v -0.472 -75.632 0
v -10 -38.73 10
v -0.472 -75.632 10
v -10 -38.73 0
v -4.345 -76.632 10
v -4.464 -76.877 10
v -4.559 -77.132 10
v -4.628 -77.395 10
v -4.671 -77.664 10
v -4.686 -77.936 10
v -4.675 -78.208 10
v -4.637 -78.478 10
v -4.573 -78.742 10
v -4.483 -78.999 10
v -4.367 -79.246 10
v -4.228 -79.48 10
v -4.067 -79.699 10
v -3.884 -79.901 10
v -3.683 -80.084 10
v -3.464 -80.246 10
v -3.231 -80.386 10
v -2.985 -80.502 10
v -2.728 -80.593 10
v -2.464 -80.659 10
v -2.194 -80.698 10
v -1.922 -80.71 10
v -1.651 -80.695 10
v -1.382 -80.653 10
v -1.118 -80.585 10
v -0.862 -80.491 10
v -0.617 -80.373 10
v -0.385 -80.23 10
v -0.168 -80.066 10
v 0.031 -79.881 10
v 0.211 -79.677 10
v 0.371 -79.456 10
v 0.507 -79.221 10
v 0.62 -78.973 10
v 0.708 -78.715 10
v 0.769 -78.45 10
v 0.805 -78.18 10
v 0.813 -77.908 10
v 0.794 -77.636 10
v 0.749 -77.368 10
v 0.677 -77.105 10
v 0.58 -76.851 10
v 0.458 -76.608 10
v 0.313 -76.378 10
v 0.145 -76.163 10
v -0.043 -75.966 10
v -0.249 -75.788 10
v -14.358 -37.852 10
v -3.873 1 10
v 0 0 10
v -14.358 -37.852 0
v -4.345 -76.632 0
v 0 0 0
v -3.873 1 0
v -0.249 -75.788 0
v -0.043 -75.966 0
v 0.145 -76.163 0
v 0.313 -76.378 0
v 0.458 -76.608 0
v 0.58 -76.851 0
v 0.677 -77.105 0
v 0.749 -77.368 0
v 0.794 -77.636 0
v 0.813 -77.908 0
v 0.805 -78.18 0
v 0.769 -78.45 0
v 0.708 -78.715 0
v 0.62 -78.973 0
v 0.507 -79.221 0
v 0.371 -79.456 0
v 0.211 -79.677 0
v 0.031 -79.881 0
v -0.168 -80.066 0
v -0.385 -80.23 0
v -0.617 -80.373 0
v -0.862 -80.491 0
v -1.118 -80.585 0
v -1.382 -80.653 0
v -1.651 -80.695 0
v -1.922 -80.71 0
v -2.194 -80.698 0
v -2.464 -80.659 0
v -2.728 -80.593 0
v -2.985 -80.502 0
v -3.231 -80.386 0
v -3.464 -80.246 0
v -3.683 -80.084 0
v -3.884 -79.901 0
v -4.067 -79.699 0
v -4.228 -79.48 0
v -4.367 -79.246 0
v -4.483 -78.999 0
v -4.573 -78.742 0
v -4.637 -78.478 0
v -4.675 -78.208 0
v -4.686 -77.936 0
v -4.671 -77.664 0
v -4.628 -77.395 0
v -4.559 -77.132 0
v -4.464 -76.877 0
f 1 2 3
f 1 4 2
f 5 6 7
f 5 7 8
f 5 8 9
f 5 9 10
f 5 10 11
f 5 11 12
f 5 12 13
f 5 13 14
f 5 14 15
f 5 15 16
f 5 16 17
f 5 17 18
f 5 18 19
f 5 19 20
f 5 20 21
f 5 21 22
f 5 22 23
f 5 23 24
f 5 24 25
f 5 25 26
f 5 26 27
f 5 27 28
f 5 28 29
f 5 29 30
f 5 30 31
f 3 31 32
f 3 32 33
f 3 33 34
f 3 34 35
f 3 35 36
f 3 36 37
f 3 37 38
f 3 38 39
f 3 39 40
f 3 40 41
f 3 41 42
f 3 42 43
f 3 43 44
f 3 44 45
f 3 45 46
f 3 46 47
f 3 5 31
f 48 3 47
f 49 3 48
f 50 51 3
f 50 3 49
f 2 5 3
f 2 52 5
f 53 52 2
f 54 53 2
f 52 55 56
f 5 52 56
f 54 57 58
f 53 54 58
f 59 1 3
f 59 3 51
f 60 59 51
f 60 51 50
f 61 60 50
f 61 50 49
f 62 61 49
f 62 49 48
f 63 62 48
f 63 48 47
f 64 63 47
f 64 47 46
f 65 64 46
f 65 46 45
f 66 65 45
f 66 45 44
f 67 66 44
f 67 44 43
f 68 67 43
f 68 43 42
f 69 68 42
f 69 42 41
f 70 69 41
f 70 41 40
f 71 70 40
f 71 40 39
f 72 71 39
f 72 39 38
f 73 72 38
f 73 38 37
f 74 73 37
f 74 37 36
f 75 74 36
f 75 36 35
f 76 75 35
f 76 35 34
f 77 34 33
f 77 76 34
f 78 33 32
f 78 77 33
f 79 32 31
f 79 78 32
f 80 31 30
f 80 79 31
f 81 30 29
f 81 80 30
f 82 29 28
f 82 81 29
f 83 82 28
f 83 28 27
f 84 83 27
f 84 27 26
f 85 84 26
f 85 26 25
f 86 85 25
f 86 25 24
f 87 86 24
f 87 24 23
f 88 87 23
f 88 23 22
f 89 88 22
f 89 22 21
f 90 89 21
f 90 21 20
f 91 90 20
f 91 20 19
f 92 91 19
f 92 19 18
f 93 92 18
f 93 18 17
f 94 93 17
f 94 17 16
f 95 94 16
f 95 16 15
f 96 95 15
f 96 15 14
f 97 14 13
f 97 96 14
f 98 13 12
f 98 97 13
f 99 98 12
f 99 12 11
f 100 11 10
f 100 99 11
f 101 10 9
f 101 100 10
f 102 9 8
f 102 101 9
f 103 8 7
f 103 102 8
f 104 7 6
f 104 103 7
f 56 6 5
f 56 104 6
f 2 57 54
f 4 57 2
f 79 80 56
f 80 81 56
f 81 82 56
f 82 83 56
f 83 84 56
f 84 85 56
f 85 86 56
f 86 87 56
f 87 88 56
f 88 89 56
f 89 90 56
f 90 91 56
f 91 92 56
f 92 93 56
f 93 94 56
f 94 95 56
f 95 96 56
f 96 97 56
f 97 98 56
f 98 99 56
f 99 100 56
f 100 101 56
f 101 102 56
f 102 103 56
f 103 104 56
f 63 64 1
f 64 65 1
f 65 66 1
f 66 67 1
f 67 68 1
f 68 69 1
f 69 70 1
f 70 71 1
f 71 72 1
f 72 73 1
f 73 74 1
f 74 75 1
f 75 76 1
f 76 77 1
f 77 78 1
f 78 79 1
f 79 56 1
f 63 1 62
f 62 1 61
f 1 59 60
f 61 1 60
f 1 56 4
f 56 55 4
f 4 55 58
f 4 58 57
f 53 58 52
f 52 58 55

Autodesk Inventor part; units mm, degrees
ref_plane "YZ Plane" through (0, 0, 0) normal (1, 0, 0) x (0, 1, 0)
ref_plane "XZ Plane" through (0, 0, 0) normal (0, 1, 0) x (-1, 0, 0)
ref_plane "XY Plane" through (0, 0, 0) normal (0, 0, 1) x (1, 0, 0)
sketch "Sketch1 - gripper" plane through (0, 0, 0) normal (0, 0, 1) x (1, 0, 0)
  line L0 (0, 0) -> (-10, -38.7298)
  line L1 (-10, -38.7298) -> (0, -38.7298) construction
  line L2 (-10, -38.7298) -> (0, -77.4597)
  line L3 (0, 0) -> (-3.873, 1)
  line L4 (-3.873, 1) -> (-14.3579, -37.8519)
  line L5 (-14.3579, -37.8519) -> (-3.873, -78.4597)
  line L6 (-3.873, -78.4597) -> (0, -77.4597)
  circle A0 centre (-1.9365, -77.9597) radius 2.75
  point P0 (-4.3448, -76.6321)
  point P1 (-0.4719, -75.6321)
  dimension "d18" = 40
  dimension "d19" = 40
  dimension "d20" = 4
  dimension "d21" = 5.5
extrude "Extrusion1" add sketch "Sketch1 - gripper" along normal blind 10
sketch "Sketch3" plane through (0, 0, 0) normal (0, 0, -1) x (-1, 0, 0)
  line L0 (10, -38.7298) -> (0, 0) construction
  line L1 (3.873, 1) -> (14.3579, -37.8519) projected
  line L2 (4.1429, 0) -> (-40.8571, 0)
  line L3 (-40.8571, 0) -> (-40.8571, 25)
  line L4 (-40.8571, 25) -> (4.1429, 25)
  line L5 (4.1429, 25) -> (4.1429, 0)
  dimension "d22" = 45
  dimension "d23" = 25
properties part number "arm1"
